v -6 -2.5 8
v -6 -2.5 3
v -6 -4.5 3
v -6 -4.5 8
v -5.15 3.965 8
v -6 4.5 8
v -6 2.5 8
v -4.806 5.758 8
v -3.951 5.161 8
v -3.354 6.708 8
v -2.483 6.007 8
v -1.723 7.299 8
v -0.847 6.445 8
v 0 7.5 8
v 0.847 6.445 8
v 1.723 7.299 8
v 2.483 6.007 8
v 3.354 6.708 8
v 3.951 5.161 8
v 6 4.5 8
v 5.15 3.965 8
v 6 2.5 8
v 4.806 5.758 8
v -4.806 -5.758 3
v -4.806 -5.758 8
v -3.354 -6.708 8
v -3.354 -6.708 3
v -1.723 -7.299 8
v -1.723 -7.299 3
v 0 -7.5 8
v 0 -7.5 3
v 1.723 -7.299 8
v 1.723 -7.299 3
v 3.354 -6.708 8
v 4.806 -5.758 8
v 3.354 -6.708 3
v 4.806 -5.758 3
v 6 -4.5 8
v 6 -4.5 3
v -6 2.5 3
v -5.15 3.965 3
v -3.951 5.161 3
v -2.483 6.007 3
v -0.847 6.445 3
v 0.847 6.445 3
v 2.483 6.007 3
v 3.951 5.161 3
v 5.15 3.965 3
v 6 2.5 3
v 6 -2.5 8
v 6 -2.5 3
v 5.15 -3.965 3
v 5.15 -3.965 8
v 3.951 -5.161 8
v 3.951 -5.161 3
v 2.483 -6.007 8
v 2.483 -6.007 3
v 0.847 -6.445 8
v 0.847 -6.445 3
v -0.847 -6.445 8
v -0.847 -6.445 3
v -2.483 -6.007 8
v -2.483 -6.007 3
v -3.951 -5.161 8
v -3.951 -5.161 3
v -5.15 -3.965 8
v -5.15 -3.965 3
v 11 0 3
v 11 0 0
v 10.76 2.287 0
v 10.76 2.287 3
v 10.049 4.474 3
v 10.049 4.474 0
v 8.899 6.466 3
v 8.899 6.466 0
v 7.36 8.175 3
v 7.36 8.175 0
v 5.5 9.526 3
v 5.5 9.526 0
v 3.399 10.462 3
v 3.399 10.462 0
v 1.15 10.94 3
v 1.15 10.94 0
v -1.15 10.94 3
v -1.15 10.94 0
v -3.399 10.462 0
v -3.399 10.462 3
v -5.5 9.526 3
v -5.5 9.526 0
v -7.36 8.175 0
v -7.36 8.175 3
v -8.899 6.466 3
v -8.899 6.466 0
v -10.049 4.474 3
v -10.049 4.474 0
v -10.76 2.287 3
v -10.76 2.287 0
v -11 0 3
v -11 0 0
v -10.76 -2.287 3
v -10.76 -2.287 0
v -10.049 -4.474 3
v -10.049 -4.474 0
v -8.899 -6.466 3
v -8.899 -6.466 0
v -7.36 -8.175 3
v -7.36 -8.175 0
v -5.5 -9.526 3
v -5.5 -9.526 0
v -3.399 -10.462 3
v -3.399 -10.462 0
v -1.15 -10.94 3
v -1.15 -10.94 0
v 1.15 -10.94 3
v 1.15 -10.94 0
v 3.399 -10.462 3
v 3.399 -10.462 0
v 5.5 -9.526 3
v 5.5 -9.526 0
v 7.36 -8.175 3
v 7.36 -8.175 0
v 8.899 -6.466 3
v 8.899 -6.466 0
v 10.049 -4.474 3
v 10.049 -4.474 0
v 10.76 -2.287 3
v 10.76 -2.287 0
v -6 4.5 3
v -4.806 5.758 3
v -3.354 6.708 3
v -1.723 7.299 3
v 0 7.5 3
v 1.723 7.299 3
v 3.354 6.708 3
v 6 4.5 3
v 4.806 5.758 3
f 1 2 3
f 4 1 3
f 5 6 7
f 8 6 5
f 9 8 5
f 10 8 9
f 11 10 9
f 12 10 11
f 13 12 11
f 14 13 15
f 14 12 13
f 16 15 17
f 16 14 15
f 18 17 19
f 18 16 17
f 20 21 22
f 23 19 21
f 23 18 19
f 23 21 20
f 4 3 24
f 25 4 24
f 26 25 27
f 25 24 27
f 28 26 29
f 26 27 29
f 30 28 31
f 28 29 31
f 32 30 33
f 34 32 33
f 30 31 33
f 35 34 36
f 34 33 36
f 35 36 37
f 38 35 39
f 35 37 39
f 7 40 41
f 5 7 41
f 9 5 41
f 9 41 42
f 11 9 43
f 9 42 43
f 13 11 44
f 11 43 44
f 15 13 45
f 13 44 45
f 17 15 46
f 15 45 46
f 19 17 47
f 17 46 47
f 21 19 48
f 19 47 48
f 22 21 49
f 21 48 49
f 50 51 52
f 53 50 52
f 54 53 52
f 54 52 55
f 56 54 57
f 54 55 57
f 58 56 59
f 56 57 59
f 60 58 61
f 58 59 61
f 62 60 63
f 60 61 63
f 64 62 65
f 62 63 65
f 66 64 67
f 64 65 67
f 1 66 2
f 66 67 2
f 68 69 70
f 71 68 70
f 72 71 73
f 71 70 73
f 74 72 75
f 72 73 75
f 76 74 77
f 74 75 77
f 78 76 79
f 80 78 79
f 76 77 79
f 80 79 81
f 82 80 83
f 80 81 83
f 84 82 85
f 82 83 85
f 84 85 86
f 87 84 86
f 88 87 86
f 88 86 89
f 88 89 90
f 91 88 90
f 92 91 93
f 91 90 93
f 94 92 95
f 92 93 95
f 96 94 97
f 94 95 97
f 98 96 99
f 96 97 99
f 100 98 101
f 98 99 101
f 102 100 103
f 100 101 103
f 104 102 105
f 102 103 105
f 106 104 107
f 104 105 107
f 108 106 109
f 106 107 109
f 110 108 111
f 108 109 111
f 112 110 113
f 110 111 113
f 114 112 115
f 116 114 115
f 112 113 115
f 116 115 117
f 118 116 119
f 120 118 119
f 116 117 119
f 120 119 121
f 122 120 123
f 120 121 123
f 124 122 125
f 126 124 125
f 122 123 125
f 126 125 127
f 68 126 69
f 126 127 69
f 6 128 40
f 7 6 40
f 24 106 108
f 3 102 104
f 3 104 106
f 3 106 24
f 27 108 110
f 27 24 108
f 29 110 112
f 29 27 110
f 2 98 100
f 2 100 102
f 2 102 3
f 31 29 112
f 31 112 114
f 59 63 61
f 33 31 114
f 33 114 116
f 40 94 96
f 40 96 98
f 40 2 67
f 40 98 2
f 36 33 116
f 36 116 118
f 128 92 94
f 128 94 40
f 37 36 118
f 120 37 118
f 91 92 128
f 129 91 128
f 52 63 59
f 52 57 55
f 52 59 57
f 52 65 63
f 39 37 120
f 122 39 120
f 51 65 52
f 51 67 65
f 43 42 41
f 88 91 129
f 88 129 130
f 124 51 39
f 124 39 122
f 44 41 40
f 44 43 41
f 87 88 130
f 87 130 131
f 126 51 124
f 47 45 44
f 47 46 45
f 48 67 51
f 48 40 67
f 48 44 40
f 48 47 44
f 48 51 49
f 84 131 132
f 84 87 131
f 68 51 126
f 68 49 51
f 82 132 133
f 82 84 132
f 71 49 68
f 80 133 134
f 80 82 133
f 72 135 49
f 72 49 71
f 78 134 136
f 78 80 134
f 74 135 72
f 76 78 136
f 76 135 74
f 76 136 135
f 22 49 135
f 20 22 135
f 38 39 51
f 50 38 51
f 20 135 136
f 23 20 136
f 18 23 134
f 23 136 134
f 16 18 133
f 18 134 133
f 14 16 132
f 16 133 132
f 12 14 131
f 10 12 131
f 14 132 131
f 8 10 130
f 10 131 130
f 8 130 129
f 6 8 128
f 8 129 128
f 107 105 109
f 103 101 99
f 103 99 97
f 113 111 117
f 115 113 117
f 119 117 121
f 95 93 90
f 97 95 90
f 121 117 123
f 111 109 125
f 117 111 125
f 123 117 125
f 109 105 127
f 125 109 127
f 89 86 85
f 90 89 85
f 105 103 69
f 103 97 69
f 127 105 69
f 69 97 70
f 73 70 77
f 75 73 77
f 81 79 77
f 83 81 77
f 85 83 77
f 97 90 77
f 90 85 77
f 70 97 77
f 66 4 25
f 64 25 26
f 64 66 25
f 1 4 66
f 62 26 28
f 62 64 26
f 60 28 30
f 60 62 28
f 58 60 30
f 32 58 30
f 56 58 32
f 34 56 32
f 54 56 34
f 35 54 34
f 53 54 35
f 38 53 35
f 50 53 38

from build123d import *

# Parameters (mm, degrees)
F0_R     = 11
F1_DEPTH = 3
F3_DEPTH = 5


with BuildPart() as f1:
    # F0 (on Top) → F1 (new body)
    with BuildSketch(Plane.XY):
        Circle(F0_R)
    extrude(amount=F1_DEPTH)

    # F2 (on face) → F3 (join)
    with BuildSketch(Plane.XY.offset(3)):
        with BuildLine():
            Line((6, 2.5), (6, 4.5))
            ThreePointArc((6, 4.5), (0, 7.5), (-6, 4.5))
            Line((-6, 4.5), (-6, 2.5))
            ThreePointArc((-6, 2.5), (0, 6.5), (6, 2.5))
        make_face()
        with BuildLine():
            Line((6, -4.5), (6, -2.5))
            ThreePointArc((6, -2.5), (0, -6.5), (-6, -2.5))
            Line((-6, -2.5), (-6, -4.5))
            ThreePointArc((-6, -4.5), (0, -7.5), (6, -4.5))
        make_face()
    extrude(amount=F3_DEPTH)


solid = f1.part
